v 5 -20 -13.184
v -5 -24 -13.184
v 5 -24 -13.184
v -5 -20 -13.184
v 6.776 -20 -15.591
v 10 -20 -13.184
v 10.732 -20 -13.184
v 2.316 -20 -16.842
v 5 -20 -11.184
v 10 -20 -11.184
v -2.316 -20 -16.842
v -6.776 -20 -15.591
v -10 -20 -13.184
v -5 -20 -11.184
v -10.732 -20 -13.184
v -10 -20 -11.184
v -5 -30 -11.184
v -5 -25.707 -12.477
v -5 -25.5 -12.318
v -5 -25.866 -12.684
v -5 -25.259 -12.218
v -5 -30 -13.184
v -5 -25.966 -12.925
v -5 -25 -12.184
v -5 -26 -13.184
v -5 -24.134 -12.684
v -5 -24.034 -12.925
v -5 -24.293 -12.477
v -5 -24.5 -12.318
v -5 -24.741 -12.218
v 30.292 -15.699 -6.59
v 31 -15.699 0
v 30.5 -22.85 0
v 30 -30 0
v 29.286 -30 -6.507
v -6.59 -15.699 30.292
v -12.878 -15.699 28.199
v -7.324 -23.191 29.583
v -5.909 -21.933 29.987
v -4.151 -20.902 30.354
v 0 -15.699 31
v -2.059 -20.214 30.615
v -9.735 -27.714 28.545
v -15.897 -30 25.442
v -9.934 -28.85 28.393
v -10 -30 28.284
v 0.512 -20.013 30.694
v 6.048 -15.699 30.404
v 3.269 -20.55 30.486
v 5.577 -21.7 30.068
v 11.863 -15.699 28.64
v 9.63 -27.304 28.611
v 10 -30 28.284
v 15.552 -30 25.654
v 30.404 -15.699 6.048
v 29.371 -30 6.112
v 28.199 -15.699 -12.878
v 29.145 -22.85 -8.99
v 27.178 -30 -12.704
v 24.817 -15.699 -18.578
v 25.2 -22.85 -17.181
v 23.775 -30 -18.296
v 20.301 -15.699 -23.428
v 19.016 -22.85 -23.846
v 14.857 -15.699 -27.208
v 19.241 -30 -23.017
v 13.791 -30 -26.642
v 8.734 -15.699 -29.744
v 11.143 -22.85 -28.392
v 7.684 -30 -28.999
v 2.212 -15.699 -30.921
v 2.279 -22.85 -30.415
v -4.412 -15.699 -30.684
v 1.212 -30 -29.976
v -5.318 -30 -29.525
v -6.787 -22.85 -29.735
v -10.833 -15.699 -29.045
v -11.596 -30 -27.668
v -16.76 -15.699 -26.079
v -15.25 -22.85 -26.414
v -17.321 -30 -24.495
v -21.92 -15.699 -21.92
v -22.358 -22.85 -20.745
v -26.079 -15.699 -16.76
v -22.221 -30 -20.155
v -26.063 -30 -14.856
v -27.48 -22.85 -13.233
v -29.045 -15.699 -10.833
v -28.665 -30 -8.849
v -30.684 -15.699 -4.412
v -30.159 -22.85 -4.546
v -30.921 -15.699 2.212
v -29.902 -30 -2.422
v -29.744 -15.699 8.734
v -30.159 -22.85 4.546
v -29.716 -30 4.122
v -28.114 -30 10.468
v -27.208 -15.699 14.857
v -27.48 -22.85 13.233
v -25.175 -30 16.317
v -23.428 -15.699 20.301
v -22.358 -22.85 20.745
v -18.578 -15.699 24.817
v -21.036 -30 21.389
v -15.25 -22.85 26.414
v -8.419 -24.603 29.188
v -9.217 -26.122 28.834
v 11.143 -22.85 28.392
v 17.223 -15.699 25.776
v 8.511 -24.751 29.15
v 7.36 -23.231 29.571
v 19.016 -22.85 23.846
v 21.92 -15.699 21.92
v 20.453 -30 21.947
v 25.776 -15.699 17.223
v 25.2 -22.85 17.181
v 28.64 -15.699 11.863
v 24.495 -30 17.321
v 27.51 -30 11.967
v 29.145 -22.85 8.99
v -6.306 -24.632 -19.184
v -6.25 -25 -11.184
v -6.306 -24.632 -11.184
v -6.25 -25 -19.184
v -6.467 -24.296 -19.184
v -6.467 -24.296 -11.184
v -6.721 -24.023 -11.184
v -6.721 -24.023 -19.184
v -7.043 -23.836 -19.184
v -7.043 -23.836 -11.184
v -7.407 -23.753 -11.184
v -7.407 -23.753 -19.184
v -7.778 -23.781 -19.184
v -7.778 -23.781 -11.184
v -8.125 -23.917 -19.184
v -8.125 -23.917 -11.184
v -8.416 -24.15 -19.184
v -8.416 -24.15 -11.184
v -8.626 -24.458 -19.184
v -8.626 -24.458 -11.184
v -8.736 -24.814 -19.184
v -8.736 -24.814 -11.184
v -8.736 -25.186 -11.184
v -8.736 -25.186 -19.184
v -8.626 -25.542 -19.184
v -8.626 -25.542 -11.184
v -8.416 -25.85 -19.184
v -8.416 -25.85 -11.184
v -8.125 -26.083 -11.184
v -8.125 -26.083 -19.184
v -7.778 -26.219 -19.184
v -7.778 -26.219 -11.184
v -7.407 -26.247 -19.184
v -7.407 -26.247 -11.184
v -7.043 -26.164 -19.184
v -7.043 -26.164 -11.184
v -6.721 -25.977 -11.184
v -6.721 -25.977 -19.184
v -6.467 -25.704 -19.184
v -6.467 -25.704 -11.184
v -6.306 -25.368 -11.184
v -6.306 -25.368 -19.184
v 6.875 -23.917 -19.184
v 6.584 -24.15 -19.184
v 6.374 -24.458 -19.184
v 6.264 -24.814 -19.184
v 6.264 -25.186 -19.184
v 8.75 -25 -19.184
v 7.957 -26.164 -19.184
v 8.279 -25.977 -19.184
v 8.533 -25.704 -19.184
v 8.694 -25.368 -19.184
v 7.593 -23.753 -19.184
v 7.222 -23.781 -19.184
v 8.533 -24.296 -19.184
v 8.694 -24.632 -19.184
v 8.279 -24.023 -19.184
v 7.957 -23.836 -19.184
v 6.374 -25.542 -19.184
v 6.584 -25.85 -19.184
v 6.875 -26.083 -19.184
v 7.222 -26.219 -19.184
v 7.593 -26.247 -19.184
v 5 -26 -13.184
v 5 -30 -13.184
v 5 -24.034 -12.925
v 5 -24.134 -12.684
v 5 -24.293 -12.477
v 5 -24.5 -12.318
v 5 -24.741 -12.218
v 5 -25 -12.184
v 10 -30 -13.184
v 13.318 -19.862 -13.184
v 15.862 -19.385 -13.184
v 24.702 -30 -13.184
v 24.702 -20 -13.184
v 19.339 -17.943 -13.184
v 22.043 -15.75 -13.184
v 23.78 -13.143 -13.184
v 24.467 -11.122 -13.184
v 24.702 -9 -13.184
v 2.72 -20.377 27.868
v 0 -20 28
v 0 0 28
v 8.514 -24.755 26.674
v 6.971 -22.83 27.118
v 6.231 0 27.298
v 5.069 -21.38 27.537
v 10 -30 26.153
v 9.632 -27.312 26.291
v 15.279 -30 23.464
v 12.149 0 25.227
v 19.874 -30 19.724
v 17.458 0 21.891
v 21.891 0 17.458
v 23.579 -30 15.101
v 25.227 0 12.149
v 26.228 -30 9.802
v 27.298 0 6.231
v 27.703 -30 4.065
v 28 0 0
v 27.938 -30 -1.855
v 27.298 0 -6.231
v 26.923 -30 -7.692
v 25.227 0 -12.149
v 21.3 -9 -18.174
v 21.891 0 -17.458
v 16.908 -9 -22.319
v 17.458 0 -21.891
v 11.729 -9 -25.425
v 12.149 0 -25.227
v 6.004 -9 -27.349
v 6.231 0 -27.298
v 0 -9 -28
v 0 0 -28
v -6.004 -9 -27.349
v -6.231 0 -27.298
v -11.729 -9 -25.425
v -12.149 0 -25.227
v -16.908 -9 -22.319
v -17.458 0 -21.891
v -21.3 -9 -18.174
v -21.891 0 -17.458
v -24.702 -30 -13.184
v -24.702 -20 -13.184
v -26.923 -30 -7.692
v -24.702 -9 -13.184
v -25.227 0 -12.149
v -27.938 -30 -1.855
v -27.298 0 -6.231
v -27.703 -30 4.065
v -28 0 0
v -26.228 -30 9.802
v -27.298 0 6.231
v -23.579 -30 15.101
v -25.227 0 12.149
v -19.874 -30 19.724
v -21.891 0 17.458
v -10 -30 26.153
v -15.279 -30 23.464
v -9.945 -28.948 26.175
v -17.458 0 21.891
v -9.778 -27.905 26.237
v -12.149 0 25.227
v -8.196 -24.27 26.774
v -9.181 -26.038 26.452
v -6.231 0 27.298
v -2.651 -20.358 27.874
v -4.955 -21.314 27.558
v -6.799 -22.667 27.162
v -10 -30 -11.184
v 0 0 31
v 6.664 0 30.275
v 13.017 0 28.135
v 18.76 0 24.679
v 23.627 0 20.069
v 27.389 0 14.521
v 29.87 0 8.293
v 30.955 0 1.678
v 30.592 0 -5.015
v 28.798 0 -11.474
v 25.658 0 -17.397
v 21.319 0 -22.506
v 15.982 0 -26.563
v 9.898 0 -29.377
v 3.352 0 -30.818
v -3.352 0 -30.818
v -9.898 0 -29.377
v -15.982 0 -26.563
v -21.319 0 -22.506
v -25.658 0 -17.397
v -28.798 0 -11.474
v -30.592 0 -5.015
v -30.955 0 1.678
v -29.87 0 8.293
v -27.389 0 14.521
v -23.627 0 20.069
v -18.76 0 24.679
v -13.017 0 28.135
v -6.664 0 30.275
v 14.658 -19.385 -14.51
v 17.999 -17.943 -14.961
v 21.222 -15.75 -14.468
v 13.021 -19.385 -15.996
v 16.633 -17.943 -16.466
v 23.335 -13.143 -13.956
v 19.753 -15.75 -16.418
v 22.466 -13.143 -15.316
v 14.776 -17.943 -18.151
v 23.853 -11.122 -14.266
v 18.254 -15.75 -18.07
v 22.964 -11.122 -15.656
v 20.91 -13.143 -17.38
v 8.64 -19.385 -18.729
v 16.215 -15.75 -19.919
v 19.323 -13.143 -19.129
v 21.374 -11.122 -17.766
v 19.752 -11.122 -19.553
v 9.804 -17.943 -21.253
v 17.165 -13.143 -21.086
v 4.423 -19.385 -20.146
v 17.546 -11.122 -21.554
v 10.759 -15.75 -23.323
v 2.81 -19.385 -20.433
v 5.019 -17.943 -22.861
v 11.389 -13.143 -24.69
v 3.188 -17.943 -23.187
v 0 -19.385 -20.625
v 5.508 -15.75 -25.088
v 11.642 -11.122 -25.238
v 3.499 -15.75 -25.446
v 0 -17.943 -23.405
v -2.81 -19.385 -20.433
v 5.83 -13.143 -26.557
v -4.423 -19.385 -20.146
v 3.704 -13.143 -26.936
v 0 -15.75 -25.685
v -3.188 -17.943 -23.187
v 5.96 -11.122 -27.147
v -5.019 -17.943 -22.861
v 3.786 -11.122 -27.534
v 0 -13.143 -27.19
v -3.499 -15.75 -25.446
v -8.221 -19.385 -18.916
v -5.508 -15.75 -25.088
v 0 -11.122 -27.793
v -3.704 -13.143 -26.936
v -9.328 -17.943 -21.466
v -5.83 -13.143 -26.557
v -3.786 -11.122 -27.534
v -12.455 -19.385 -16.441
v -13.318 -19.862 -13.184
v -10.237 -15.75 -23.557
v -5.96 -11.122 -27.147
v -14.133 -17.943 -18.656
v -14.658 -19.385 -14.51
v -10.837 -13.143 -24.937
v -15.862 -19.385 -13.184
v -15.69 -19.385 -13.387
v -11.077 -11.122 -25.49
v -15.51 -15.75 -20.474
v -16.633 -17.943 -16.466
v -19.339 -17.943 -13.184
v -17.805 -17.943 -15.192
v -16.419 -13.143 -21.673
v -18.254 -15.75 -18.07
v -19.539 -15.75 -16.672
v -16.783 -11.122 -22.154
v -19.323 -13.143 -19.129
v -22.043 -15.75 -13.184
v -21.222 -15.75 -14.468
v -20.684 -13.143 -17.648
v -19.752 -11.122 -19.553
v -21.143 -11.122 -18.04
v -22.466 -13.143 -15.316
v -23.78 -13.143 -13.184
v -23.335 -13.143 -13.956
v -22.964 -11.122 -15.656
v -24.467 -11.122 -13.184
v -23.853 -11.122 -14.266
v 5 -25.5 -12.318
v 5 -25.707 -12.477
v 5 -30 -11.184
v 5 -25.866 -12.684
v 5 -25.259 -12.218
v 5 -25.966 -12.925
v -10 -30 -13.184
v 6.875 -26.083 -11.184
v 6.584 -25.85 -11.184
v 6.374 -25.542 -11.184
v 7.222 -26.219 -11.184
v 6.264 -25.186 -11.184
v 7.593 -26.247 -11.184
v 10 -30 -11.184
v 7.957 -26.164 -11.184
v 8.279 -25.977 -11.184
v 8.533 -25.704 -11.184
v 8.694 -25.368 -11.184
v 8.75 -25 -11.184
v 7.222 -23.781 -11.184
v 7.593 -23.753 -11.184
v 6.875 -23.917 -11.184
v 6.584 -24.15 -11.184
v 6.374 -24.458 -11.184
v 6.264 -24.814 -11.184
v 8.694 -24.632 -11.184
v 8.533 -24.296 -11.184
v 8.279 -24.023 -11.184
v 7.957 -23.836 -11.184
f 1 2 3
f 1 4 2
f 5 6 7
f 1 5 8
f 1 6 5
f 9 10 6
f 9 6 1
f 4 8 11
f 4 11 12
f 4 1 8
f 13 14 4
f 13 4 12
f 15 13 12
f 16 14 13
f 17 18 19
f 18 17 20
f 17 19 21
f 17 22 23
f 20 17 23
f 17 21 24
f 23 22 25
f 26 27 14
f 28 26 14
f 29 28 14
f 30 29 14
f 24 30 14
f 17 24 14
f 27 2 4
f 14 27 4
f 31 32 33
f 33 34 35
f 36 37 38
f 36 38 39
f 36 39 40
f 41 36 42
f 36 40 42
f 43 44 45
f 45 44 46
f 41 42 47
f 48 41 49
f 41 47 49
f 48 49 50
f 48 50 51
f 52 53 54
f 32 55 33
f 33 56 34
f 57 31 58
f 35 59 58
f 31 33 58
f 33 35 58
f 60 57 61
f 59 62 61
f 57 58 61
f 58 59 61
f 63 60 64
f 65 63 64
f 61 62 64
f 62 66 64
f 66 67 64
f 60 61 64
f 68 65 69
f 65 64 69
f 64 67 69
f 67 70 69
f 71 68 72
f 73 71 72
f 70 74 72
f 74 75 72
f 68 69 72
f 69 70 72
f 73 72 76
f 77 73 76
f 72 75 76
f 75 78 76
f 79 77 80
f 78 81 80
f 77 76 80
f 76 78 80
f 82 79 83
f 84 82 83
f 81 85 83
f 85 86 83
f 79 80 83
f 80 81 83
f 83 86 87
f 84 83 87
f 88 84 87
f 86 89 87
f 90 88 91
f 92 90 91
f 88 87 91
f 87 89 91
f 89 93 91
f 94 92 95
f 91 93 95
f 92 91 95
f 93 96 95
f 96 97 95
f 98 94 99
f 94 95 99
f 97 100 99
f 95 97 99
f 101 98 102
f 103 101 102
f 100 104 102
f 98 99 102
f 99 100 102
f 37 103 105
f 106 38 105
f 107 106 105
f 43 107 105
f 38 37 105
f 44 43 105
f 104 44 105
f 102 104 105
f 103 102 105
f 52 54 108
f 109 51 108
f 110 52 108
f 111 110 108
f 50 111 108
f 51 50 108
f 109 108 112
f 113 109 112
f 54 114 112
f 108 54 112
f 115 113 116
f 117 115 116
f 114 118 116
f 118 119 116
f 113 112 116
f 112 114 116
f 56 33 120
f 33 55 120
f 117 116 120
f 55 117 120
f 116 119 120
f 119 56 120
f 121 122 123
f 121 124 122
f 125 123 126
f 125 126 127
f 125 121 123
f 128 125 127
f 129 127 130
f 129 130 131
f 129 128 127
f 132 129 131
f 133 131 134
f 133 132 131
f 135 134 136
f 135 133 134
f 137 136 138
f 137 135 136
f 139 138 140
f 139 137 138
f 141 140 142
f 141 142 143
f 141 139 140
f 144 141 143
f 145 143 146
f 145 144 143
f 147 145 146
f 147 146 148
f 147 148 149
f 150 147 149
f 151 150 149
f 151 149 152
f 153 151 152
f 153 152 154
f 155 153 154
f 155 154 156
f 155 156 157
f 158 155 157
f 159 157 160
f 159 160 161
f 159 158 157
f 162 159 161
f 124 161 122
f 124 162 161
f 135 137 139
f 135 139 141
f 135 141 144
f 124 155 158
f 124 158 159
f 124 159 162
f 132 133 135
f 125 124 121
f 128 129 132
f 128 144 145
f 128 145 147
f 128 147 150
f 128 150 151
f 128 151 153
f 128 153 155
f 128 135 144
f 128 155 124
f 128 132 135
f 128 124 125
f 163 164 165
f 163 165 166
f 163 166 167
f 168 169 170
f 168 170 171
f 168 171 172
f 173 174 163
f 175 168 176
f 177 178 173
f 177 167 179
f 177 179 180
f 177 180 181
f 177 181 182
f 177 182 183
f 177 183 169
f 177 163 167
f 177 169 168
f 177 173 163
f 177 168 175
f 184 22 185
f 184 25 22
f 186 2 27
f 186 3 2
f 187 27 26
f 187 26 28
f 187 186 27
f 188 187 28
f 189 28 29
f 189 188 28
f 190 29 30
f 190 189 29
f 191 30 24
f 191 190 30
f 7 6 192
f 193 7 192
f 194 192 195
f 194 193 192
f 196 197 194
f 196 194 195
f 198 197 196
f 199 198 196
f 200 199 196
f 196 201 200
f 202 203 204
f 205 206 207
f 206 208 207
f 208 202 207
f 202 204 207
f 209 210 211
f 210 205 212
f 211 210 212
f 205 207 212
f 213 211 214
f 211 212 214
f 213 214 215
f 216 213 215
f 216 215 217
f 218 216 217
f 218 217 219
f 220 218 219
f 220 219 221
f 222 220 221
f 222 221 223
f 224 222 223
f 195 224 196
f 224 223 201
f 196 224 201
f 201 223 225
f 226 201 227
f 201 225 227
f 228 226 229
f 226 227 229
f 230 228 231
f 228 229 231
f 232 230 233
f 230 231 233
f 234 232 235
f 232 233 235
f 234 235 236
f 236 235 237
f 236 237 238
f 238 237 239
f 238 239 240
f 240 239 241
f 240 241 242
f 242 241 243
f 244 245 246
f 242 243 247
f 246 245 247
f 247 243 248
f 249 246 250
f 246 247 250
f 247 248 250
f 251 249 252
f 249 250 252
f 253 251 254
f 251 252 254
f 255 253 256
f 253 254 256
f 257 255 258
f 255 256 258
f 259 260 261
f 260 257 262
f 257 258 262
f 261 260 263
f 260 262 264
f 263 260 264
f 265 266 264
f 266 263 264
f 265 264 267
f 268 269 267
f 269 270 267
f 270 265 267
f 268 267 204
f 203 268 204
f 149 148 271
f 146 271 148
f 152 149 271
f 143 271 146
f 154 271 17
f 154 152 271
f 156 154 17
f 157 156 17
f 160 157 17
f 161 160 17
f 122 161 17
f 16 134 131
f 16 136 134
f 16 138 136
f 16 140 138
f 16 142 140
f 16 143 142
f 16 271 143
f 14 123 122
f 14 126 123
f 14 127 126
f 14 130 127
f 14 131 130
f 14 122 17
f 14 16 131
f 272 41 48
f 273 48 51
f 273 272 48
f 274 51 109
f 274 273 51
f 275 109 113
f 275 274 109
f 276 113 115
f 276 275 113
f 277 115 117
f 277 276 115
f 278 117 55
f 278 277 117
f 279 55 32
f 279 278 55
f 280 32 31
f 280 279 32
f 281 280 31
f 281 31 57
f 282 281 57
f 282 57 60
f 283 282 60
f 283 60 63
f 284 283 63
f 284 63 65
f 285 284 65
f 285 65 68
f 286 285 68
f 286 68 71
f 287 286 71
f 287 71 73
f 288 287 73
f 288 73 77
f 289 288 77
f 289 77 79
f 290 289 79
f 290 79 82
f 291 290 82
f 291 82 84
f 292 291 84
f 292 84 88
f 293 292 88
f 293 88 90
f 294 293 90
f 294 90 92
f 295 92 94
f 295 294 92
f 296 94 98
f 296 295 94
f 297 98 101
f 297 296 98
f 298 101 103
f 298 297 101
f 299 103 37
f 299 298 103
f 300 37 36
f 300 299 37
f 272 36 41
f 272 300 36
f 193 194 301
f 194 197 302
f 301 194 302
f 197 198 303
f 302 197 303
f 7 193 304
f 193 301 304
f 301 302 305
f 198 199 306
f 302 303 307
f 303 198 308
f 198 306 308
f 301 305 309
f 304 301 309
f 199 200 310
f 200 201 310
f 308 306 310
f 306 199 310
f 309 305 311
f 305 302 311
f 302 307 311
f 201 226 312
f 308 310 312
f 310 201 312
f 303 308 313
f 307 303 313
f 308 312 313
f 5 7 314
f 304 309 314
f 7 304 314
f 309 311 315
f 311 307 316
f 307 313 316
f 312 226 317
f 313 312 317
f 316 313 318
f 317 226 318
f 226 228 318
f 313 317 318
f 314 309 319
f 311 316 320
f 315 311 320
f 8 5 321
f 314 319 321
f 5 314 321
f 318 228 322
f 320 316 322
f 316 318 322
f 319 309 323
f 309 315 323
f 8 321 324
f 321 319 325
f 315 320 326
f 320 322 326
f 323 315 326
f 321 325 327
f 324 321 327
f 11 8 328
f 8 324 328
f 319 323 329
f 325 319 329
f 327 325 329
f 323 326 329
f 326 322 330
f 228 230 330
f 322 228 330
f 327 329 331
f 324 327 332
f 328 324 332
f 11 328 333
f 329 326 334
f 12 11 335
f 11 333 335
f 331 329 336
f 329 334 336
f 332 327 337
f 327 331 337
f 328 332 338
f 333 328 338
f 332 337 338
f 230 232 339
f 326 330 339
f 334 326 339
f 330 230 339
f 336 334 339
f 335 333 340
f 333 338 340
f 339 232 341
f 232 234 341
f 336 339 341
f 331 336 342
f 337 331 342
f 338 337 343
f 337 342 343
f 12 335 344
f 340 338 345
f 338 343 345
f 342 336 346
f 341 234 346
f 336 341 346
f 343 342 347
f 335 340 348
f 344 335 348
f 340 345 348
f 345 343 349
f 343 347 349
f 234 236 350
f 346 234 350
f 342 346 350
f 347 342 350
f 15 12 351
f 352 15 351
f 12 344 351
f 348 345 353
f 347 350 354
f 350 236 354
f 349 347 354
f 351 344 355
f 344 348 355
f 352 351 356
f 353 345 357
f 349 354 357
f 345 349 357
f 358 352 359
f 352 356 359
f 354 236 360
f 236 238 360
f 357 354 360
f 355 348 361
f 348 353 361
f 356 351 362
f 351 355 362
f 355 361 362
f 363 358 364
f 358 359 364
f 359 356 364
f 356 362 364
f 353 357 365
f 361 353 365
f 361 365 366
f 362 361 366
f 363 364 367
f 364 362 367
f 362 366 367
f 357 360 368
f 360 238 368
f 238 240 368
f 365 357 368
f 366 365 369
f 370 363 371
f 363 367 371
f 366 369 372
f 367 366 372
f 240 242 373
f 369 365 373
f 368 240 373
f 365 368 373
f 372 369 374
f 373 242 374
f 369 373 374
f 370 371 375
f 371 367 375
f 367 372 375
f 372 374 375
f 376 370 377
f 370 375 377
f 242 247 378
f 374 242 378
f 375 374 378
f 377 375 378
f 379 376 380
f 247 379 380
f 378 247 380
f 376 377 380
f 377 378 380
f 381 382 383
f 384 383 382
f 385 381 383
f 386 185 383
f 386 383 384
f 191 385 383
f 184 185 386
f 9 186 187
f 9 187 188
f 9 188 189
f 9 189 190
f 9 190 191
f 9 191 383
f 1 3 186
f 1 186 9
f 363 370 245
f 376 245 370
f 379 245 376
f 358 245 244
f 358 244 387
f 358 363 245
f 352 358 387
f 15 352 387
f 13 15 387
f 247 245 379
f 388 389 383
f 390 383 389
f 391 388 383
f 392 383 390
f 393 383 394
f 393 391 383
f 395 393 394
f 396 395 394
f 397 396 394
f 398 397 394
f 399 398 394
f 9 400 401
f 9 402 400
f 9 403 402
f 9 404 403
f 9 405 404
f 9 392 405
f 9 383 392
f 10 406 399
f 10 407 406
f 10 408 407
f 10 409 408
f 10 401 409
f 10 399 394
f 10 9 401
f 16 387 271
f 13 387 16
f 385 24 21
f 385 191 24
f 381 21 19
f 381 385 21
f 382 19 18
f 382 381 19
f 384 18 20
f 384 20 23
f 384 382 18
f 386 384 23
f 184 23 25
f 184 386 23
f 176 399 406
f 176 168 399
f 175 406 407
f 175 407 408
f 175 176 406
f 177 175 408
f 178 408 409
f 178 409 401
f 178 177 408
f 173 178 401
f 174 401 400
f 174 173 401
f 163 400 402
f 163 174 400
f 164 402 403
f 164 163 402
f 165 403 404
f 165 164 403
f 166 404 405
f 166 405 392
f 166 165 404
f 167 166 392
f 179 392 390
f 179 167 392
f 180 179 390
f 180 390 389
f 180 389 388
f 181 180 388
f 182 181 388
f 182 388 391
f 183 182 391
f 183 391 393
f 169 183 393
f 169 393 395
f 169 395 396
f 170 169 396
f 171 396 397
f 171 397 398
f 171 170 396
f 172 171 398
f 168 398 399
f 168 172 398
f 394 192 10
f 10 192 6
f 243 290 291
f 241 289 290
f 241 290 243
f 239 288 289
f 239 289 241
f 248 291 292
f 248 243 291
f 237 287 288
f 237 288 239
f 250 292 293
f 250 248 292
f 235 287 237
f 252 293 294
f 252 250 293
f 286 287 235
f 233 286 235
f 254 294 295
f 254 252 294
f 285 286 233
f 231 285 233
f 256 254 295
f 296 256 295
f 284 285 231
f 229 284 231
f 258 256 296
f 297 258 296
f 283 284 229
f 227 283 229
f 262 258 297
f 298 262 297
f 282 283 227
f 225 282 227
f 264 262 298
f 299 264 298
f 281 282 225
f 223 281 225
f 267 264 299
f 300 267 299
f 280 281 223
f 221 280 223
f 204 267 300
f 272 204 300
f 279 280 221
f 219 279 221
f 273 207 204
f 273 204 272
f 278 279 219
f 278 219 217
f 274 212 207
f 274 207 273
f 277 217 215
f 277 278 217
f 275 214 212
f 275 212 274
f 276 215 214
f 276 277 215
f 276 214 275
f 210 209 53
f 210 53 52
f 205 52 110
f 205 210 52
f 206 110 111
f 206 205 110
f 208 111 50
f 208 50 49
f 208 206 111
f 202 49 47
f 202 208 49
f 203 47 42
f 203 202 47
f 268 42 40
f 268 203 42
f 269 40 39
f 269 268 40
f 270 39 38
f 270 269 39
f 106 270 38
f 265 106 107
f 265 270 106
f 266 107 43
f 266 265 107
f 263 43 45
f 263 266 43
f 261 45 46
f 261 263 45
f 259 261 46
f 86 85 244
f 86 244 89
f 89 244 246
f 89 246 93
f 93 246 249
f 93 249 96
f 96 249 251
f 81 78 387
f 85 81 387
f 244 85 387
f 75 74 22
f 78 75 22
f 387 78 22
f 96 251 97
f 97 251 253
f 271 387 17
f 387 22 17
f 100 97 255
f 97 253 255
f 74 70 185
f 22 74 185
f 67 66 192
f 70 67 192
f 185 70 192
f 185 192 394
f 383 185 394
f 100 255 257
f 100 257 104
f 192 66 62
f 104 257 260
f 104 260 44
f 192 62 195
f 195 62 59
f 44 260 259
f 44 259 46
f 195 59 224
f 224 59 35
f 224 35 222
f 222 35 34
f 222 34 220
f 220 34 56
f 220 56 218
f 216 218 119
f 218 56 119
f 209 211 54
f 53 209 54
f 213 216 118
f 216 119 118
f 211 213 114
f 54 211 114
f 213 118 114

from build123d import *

# Parameters (mm, degrees)
SKETCH1_R           = 31
SKETCH1_R_2         = 28
BOSS_EXTRUDE1_DEPTH = 30
BOSS_EXTRUDE2_START = -10
BOSS_EXTRUDE2_DEPTH = 10
CUT_EXTRUDE1_DEPTH  = 51
SKETCH4_W           = 5
SKETCH4_H           = 10
SKETCH4_R           = 1.25
BOSS_EXTRUDE3_DEPTH = 2
SKETCH4_3_W         = 10
SKETCH4_3_H         = 2
BOSS_EXTRUDE4_DEPTH = 1
CUT_EXTRUDE2_START  = -6
SKETCH4_4_R         = 1.25
CUT_EXTRUDE2_DEPTH  = 6
FILLET1_R           = 1
FILLET3_R           = 11


with BuildPart() as part:
    # Sketch1 → Boss-Extrude1 (new body)
    with BuildSketch(Plane(origin=(0, 0, 0), x_dir=(1, 0, 0), z_dir=(0, 1, 0))):
        with Locations(Location((0, 0, 0), (0, 0, 270))):
            Circle(SKETCH1_R)
        with Locations(Location((0, 0, 0), (0, 0, 270))):
            Circle(SKETCH1_R_2, mode=Mode.SUBTRACT)
    extrude(amount=-BOSS_EXTRUDE1_DEPTH)

    # Sketch2 → Boss-Extrude2 (add)
    with BuildSketch(Plane.XZ.offset(30).offset(BOSS_EXTRUDE2_START)):
        with BuildLine():
            Line((-24.701905706, -13.183924092), (24.701905706, -13.183924092))
            ThreePointArc((24.701905706, -13.183924092), (0, -28), (-24.701905706, -13.183924092))
        make_face()
    extrude(amount=BOSS_EXTRUDE2_DEPTH)

    # Sketch3 → Cut-Extrude1 (cut)
    with BuildSketch(Plane.XY.offset(-13.183924092)):
        with BuildLine():
            Line((-10, -30), (10, -30))
            ThreePointArc((10, -30), (0, -20), (-10, -30))
        make_face()
    extrude(amount=CUT_EXTRUDE1_DEPTH, mode=Mode.SUBTRACT)

    # Sketch4 → Boss-Extrude3 (add)
    # profile 1 of 2: a face of its own
    with BuildSketch(Plane.XY.offset(-13.183924092)):
        with Locations((-7.5, -25)):
            Rectangle(SKETCH4_W, SKETCH4_H)
        with Locations((-7.5, -25)):
            Circle(SKETCH4_R, mode=Mode.SUBTRACT)
    # profile 2 of 2: a face of its own
    with BuildSketch(Plane.XY.offset(-13.183924092)):
        with Locations((7.5, -25)):
            Rectangle(SKETCH4_W, SKETCH4_H)
        with Locations((7.5, -25)):
            Circle(SKETCH4_R, mode=Mode.SUBTRACT)
    extrude(amount=BOSS_EXTRUDE3_DEPTH)

    # Sketch4<3> → Boss-Extrude4 (add)
    with BuildSketch(Plane.XY.offset(-13.183924092)):
        with Locations((0, -25)):
            Rectangle(SKETCH4_3_W, SKETCH4_3_H)
    extrude(amount=BOSS_EXTRUDE4_DEPTH)

    # Sketch4<4> → Cut-Extrude2 (cut)
    with BuildSketch(Plane.XY.offset(-13.183924092).offset(CUT_EXTRUDE2_START)):
        with Locations((-7.5, -25)):
            Circle(SKETCH4_4_R)
        with Locations((7.5, -25)):
            Circle(SKETCH4_4_R)
    extrude(amount=CUT_EXTRUDE2_DEPTH, mode=Mode.SUBTRACT)

    # Fillet1
    fillet1_edges = [part.edges().sort_by_distance(p)[0] for p in [
        (0, -24, -12.183924092),
        (0, -26, -12.183924092),
    ]]
    fillet(fillet1_edges, radius=FILLET1_R - 0.0001)  # a hair under: the kernel refuses the full size

    # Chamfer1: read off the stored shape, not the designer's step
    # Chamfer1 outline → Chamfer1 (revolve, cut)
    with BuildSketch(Plane.XY):
        Polygon((31, -15.699333743), (30, -30), (31, -30), align=None)
    revolve(axis=Axis((0, 0, 0), (0, 1, 0)), mode=Mode.SUBTRACT)

    # Fillet3
    fillet3_edges = [part.edges().sort_by_distance(p)[0] for p in [
        (0, -20, -28),
    ]]
    fillet(fillet3_edges, radius=FILLET3_R)


solid = part.part
